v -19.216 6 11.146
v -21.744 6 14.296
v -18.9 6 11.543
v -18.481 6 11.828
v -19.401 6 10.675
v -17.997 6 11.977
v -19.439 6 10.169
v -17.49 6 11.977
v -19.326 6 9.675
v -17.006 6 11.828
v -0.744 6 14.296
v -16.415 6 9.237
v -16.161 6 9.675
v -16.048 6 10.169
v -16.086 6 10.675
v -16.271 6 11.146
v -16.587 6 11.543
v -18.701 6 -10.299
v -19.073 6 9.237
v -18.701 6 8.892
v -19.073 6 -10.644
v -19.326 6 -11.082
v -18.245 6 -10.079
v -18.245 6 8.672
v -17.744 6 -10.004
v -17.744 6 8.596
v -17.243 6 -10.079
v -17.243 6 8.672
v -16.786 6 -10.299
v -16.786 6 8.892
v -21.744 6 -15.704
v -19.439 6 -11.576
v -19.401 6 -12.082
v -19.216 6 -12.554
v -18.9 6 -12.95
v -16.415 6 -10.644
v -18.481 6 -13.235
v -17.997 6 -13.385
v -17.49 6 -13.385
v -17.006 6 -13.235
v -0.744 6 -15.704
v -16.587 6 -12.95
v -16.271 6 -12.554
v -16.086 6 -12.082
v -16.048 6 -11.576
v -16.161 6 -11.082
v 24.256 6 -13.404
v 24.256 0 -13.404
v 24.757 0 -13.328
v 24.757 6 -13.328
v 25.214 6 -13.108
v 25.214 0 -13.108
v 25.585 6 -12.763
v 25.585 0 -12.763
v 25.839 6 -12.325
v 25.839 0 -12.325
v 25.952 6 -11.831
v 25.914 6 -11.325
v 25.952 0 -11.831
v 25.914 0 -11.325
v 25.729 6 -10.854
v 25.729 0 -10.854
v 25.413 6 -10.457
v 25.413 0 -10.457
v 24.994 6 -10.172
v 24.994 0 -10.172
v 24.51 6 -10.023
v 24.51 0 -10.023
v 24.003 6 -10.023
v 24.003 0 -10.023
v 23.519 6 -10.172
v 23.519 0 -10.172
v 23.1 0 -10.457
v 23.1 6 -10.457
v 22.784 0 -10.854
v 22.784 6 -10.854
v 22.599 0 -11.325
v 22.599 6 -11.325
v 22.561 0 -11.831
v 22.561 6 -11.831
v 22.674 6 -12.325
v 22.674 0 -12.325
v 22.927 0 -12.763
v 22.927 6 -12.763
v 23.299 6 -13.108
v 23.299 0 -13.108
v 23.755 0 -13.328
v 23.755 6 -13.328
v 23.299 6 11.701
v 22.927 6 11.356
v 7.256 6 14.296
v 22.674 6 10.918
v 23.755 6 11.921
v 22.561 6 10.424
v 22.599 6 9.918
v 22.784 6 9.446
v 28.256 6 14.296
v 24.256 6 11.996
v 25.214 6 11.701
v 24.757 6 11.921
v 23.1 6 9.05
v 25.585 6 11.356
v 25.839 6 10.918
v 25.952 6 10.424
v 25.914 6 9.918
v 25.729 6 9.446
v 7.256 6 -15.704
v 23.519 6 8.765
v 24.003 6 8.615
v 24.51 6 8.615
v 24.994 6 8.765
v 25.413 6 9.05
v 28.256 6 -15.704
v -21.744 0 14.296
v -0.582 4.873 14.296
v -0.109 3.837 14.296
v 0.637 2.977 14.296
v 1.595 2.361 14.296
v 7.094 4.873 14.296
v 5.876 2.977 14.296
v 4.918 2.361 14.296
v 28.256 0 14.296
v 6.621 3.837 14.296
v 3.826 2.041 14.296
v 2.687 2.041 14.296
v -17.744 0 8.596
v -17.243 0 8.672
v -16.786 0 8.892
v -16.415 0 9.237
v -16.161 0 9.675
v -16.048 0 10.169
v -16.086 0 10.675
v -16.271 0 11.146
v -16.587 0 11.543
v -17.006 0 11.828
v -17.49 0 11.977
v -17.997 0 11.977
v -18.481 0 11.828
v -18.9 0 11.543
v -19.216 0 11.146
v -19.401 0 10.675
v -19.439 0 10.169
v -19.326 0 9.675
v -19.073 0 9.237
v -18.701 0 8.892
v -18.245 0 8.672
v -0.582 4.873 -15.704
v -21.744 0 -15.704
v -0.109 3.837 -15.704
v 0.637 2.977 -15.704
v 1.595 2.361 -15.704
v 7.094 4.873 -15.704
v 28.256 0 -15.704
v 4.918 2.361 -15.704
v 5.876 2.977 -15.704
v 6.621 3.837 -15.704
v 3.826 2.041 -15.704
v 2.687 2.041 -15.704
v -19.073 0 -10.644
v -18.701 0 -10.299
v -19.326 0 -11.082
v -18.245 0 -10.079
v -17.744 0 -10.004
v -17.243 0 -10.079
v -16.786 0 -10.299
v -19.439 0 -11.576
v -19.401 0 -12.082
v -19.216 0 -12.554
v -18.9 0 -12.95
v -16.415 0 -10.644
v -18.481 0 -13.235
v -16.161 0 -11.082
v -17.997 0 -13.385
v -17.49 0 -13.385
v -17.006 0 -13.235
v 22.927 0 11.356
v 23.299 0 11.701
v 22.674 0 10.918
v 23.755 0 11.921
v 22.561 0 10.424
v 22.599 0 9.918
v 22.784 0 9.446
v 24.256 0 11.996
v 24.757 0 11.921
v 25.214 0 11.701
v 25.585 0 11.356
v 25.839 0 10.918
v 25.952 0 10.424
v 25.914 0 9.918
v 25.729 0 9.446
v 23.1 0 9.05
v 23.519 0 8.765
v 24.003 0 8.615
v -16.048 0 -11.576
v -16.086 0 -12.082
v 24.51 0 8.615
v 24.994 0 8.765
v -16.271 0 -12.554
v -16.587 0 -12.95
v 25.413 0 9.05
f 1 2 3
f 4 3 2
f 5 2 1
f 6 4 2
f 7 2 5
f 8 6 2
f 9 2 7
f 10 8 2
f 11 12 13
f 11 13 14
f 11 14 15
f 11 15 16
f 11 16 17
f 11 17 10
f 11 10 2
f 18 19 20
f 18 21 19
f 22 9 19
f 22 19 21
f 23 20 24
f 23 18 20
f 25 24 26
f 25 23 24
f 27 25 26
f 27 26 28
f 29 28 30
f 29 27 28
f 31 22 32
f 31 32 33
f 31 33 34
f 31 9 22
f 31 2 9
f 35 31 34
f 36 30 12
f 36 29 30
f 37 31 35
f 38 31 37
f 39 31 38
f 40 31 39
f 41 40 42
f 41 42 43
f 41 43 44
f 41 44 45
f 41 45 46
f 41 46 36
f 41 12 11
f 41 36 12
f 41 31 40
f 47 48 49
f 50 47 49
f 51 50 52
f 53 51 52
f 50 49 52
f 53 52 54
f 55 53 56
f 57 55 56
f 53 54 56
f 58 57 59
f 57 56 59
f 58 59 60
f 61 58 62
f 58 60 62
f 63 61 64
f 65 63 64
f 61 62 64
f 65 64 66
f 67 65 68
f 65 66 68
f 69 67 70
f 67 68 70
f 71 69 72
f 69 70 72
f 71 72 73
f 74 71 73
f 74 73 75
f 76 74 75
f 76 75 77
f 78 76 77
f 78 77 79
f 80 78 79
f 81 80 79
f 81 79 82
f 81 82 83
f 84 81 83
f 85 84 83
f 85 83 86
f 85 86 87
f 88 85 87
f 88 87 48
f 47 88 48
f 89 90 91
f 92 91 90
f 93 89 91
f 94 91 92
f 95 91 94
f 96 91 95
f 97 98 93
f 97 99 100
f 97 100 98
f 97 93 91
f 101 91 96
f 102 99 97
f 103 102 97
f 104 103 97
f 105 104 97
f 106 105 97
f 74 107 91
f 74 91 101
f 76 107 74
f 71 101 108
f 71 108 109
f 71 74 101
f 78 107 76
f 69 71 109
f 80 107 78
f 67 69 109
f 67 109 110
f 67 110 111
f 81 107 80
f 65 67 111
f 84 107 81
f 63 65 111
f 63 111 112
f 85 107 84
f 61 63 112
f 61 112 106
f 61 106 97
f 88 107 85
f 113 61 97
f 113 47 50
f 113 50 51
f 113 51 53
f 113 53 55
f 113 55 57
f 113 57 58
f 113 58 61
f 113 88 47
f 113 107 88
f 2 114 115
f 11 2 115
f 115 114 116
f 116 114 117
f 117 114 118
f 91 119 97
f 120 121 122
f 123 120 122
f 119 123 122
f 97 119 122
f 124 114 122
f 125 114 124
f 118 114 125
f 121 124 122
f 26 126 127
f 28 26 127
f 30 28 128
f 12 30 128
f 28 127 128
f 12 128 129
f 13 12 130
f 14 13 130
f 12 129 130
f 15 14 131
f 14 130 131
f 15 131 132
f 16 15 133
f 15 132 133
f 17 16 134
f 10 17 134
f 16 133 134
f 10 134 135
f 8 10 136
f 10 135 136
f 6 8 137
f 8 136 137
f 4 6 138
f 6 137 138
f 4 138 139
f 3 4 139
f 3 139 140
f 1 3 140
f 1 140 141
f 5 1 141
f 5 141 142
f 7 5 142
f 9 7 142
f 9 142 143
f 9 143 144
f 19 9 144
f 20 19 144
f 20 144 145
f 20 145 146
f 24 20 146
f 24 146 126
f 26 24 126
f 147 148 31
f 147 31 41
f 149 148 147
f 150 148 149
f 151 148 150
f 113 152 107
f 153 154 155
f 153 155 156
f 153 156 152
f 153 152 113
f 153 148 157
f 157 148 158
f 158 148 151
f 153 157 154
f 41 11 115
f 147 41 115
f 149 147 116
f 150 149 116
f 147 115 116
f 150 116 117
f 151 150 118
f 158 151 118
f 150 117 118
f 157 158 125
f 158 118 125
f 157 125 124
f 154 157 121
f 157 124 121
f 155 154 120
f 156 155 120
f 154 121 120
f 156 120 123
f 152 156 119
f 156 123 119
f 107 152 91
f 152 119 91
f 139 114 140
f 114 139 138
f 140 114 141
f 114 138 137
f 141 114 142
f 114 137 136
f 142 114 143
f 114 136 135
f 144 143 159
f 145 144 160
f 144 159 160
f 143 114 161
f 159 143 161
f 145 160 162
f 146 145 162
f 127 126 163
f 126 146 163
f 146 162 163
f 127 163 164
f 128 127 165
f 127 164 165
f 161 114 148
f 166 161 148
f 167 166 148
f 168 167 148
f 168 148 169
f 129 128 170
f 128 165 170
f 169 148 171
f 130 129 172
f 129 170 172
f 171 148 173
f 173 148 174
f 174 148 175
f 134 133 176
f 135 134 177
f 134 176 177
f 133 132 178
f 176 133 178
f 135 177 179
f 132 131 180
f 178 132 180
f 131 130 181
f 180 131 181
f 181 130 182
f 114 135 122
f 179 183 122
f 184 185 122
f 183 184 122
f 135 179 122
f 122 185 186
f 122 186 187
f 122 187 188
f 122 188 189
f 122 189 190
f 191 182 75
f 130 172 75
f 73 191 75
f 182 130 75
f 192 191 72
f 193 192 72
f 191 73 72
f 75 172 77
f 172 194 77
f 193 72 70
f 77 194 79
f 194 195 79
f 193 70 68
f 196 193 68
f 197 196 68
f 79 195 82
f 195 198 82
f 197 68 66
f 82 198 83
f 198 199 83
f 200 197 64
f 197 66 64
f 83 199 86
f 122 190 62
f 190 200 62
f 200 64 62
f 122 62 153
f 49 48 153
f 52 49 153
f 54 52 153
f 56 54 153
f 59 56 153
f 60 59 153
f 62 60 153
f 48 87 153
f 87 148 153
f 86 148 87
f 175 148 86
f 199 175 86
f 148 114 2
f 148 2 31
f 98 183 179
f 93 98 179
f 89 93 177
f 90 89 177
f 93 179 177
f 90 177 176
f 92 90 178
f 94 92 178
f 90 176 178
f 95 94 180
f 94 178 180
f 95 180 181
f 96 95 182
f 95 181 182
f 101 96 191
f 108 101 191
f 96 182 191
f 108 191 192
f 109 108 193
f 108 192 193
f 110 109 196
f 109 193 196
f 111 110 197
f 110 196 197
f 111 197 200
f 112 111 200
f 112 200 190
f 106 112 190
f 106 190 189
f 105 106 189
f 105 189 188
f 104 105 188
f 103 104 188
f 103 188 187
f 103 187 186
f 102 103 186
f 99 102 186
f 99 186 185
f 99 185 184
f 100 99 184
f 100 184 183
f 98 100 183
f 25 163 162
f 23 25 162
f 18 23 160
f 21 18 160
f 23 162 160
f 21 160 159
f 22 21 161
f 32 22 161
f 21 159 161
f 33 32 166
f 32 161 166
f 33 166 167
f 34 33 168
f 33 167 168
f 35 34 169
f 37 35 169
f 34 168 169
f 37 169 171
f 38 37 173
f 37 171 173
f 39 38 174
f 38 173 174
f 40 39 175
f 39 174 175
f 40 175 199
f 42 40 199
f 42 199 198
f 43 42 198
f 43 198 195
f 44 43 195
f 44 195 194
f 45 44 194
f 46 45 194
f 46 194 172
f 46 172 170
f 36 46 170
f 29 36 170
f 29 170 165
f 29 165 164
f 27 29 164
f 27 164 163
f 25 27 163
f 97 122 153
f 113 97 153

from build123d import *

# Parameters (mm, degrees)
SCHIZZO1_W                   = 50
SCHIZZO1_H                   = 30
ESTRUSIONE_ESTRUSIONE1_DEPTH = 6
SCHIZZO2_R                   = 4
TAGLIO_ESTRUSIONE1_DEPTH     = 42.646332289
SCHIZZO3_R                   = 1.7
TAGLIO_ESTRUSIONE2_DEPTH     = 10


with BuildPart() as part:
    # Schizzo1 → Estrusione-Estrusione1 (new body)
    with BuildSketch(Plane(origin=(0, 0, 0), x_dir=(1, 0, 0), z_dir=(0, 1, 0))):
        with Locations((3.256273518, 0.703517588)):
            Rectangle(SCHIZZO1_W, SCHIZZO1_H)
    extrude(amount=ESTRUSIONE_ESTRUSIONE1_DEPTH)

    # Schizzo2 → Taglio-Estrusione1 (cut, through all)
    with BuildSketch(Plane.XY.offset(14.296482412)):
        with Locations((3.256273518, 6)):
            Circle(SCHIZZO2_R)
    extrude(amount=-TAGLIO_ESTRUSIONE1_DEPTH, mode=Mode.SUBTRACT)

    # Schizzo3 → Taglio-Estrusione2 (cut)
    with BuildSketch(Plane.XZ):
        with Locations(Location((-17.743726482, 10.296482412, 0), (0, 0, 270))):
            Circle(SCHIZZO3_R)
        with Locations(Location((24.256273518, 10.296482412, 0), (0, 0, 90))):
            Circle(SCHIZZO3_R)
        with Locations(Location((24.256273518, -11.703517588, 0), (0, 0, 270))):
            Circle(SCHIZZO3_R)
        with Locations(Location((-17.743726482, -11.703517588, 0), (0, 0, 90))):
            Circle(SCHIZZO3_R)
    extrude(amount=-TAGLIO_ESTRUSIONE2_DEPTH, mode=Mode.SUBTRACT)


solid = part.part
